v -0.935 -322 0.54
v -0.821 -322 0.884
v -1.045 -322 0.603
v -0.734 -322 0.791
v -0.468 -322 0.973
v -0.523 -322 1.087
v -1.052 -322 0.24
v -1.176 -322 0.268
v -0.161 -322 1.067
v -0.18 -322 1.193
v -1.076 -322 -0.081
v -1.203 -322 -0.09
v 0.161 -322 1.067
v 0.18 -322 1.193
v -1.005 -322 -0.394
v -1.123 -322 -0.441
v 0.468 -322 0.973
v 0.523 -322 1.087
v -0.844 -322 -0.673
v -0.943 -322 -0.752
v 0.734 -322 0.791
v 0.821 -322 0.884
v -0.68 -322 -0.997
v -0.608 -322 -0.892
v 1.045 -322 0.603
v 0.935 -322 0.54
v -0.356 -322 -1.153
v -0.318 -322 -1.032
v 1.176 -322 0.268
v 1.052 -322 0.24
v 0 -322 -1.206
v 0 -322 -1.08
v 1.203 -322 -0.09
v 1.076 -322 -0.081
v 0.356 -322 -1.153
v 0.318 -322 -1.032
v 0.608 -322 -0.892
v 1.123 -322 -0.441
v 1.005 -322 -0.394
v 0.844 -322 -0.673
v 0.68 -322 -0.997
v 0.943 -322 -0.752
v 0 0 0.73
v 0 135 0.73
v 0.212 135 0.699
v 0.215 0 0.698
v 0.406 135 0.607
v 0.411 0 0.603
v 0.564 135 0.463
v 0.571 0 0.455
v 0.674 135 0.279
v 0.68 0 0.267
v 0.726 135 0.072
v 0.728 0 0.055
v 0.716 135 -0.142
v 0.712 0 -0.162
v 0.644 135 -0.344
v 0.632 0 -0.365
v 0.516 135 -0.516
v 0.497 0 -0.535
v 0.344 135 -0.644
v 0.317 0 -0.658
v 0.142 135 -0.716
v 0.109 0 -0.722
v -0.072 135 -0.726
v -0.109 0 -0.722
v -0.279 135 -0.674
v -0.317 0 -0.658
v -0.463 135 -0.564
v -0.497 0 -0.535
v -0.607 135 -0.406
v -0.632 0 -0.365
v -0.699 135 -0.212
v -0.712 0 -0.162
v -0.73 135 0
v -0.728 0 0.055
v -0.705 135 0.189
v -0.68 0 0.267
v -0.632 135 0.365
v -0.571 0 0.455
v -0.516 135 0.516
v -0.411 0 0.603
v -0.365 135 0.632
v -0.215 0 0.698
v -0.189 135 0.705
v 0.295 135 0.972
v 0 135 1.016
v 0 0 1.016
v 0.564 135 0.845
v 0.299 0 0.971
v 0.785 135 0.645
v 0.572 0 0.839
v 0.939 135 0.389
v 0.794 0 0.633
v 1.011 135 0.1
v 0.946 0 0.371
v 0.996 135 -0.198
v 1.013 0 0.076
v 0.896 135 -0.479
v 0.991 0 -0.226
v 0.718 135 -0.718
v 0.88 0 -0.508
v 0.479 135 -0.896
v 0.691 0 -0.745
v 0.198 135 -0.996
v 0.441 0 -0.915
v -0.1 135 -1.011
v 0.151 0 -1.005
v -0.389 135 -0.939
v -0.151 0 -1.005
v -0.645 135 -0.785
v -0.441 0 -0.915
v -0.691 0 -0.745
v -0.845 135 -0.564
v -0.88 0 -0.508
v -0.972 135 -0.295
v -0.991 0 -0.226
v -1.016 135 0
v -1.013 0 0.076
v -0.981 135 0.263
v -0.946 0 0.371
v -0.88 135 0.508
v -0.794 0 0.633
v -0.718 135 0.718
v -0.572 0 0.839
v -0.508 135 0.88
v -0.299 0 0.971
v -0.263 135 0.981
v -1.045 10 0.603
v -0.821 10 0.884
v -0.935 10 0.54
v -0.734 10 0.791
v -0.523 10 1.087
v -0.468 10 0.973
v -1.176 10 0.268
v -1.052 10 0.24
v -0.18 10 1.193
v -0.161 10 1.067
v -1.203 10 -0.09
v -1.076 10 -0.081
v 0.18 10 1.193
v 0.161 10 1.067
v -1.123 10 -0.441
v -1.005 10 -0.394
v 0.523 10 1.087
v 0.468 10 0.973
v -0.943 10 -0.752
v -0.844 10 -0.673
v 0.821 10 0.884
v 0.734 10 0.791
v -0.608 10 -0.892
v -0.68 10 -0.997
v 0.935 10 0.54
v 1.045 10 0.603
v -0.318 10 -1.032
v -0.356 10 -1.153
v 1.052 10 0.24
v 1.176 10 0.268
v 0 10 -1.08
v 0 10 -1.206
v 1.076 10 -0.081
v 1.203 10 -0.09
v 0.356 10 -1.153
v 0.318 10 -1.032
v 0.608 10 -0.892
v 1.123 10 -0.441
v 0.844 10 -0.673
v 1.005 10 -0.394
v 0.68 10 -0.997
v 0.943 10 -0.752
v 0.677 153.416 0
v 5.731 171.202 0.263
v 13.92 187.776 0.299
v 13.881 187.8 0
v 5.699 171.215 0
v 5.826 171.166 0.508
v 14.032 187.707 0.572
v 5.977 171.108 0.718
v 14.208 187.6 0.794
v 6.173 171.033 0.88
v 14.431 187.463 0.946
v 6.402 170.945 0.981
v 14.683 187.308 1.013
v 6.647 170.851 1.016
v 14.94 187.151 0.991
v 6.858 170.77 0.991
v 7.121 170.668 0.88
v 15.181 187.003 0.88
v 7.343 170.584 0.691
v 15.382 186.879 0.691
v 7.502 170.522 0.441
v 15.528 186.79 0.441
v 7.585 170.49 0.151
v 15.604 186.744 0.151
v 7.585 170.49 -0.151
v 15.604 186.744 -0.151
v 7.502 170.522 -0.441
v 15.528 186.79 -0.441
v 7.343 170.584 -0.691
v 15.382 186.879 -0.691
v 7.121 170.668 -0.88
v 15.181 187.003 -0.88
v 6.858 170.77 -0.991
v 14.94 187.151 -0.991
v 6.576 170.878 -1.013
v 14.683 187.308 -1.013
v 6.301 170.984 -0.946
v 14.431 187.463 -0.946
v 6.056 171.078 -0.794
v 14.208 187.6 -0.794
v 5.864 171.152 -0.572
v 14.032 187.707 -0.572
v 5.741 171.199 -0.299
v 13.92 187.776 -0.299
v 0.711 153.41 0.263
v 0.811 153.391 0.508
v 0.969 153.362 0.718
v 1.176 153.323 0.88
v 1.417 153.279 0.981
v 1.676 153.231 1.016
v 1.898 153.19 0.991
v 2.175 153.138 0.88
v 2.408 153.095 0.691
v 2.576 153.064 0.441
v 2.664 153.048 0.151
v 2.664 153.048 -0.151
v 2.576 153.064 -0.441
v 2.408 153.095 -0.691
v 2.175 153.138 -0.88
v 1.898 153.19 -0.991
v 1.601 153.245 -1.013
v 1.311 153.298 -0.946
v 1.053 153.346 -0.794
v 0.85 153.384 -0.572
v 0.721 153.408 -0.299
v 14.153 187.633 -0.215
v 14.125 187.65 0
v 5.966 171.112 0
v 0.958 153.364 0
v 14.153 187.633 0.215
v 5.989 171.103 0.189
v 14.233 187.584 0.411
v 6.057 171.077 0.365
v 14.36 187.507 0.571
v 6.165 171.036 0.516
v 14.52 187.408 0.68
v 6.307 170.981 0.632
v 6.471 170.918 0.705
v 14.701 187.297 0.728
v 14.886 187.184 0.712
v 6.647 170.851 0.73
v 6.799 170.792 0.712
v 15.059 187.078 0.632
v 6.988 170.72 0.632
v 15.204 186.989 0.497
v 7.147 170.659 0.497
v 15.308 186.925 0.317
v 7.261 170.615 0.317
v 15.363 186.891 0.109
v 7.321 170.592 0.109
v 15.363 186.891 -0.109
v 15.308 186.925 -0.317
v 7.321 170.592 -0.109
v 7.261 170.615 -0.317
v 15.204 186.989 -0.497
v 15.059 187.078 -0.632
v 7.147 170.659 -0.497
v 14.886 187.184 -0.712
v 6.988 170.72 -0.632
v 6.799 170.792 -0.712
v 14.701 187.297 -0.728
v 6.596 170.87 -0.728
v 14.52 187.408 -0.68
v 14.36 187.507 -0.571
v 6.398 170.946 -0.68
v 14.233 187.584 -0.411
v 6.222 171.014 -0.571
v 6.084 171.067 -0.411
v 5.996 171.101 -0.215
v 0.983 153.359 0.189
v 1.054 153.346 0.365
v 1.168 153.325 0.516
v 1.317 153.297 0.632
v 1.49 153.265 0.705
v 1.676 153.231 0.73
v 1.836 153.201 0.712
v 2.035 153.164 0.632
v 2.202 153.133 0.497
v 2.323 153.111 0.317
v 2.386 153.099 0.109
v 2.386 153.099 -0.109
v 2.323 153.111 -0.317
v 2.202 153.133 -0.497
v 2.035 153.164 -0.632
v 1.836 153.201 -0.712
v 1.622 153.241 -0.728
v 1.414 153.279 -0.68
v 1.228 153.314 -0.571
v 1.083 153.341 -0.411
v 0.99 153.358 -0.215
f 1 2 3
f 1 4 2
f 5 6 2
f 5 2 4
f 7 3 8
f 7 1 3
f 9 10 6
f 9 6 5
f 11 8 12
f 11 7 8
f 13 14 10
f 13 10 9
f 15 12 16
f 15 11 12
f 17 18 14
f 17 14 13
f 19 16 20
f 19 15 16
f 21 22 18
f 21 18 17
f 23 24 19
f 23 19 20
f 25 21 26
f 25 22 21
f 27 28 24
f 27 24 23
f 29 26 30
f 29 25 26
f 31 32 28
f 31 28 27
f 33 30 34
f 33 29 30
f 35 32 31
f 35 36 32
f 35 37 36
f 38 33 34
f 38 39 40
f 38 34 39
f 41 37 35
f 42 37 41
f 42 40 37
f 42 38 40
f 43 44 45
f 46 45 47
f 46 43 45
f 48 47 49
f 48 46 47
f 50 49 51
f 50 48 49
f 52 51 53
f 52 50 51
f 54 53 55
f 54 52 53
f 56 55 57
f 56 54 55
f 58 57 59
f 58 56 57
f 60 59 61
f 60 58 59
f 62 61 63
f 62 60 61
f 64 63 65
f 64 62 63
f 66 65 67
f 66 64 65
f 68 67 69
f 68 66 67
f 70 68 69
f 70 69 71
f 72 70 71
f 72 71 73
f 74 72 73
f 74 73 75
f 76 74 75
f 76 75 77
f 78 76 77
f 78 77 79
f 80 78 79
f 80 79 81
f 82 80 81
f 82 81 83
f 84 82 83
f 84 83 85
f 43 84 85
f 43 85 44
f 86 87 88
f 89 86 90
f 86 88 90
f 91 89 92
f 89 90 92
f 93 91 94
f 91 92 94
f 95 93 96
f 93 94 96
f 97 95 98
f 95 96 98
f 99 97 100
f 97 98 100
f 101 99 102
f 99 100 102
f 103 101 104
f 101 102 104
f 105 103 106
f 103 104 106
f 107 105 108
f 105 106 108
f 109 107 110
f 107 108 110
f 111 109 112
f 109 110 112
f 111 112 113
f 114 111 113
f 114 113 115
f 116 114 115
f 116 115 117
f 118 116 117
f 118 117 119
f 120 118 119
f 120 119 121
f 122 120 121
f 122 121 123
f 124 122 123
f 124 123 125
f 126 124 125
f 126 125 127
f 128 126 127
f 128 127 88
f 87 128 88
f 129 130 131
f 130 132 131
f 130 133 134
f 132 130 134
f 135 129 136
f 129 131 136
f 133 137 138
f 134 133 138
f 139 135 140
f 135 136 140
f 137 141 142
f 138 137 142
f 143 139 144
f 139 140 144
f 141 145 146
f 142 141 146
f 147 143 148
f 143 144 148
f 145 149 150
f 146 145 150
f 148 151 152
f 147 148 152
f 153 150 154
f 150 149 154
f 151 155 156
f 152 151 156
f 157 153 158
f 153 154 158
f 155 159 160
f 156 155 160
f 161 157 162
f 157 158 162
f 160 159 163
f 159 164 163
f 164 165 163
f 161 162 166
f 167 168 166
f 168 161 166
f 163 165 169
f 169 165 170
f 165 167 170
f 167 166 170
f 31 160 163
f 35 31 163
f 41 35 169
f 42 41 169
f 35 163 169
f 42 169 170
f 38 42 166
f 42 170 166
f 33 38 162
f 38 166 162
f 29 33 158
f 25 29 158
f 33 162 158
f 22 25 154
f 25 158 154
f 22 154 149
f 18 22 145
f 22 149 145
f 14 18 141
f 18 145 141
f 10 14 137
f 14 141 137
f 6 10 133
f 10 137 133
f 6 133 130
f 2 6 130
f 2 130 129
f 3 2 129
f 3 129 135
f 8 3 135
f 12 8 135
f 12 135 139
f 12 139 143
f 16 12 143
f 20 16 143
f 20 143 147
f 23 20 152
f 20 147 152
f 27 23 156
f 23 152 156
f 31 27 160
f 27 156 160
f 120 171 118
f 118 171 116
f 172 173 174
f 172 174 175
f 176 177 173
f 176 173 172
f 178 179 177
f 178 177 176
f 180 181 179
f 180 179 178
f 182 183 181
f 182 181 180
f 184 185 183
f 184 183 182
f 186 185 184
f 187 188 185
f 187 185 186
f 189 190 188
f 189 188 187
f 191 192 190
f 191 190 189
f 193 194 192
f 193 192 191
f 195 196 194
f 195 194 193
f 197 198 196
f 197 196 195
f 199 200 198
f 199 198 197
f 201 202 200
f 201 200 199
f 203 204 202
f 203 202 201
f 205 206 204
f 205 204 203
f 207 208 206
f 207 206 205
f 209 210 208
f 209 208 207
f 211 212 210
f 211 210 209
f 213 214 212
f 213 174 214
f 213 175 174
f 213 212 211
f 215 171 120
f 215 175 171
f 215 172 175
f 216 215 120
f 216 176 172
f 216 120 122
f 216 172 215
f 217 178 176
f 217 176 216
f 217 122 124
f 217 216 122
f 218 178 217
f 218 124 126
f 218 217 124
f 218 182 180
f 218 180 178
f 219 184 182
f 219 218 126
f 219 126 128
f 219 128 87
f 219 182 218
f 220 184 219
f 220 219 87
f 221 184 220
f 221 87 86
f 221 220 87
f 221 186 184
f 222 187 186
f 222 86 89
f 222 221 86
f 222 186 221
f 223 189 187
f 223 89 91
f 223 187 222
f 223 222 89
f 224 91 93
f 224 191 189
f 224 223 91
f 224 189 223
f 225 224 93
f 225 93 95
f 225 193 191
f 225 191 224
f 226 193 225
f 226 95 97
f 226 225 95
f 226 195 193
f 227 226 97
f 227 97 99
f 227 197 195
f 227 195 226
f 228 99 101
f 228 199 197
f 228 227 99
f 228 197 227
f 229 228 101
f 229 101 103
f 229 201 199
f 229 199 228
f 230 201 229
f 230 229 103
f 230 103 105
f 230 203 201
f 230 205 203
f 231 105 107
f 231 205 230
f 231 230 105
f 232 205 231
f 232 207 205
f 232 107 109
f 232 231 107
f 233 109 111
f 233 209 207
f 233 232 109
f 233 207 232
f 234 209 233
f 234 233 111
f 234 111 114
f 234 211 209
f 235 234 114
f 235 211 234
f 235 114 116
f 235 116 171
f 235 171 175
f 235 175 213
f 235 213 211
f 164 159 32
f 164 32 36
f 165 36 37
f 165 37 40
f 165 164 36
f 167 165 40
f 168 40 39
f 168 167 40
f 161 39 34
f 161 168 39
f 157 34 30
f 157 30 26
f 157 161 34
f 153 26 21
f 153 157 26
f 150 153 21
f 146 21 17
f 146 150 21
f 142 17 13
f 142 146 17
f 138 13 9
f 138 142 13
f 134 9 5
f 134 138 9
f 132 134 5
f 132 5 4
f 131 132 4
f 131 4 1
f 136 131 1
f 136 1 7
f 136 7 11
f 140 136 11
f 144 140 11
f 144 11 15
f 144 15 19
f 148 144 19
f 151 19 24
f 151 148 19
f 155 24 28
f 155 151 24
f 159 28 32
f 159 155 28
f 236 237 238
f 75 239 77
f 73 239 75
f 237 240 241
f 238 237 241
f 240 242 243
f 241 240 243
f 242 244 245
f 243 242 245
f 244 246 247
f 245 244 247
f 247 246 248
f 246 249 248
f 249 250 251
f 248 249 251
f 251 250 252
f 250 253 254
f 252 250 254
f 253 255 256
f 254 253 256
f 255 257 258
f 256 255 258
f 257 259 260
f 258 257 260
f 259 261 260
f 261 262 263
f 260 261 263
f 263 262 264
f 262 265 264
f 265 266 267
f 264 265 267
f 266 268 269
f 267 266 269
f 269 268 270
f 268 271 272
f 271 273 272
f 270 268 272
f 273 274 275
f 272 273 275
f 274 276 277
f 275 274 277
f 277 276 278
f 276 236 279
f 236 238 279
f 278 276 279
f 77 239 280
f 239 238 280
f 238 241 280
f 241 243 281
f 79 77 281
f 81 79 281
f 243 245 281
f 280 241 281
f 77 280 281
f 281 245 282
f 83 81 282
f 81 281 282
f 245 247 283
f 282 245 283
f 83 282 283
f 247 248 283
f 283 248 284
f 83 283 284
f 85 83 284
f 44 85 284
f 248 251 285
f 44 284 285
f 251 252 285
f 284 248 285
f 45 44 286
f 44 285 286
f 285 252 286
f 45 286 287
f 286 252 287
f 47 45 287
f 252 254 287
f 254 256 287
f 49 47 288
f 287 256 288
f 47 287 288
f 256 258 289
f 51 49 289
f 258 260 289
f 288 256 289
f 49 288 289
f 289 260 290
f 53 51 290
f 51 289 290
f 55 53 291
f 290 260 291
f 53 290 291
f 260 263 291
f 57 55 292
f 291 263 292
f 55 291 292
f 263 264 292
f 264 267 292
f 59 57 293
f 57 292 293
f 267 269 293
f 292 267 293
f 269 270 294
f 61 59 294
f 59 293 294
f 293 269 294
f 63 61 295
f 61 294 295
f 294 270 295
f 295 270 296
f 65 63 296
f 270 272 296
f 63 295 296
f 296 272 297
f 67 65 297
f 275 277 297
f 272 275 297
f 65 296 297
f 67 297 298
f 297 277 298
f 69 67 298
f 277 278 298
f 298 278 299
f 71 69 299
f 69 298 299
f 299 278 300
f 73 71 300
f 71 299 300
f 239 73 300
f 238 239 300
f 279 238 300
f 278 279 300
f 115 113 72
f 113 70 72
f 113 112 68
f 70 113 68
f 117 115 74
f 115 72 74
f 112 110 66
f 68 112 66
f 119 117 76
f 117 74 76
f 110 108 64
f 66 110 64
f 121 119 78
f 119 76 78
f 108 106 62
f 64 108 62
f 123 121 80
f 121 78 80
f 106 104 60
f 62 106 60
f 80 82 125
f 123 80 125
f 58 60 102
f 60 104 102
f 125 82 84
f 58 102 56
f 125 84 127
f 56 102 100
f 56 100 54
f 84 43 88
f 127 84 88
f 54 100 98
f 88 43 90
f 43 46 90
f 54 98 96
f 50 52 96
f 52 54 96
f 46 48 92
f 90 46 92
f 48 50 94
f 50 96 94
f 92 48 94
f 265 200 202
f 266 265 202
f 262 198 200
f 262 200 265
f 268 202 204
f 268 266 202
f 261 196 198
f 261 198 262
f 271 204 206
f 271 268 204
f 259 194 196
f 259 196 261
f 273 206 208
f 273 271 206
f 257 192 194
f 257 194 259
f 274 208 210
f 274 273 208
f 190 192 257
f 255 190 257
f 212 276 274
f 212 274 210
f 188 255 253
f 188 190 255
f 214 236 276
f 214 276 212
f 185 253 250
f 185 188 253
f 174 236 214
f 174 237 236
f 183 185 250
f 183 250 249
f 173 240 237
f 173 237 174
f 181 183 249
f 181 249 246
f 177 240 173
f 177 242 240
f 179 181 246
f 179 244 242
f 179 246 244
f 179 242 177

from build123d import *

# Parameters (mm, degrees)
SKETCH1_R           = 1.016
SKETCH1_R_2         = 0.73
BOSS_EXTRUDE1_DEPTH = 135
SWEEP2_OUTLINE_R    = 1.016
SWEEP2_OUTLINE_R_2  = 0.73
SWEEP2_ANGLE        = 31.512679
SKETCH4_R           = 1.2065
SKETCH4_R_2         = 1.0795
BOSS_EXTRUDE2_DEPTH = 332


# Read off the part's stored shape, not the designer's step: Sweep2
with BuildPart() as part:
    # Sketch1 → Boss-Extrude1 (new body)
    with BuildSketch(Plane(origin=(0, 0, 0), x_dir=(1, 0, 0), z_dir=(0, 1, 0))):
        with Locations(Location((0, 0, 0), (0, 0, 270))):
            Circle(SKETCH1_R)
        with Locations(Location((0, 0, 0), (0, 0, 270))):
            Circle(SKETCH1_R_2, mode=Mode.SUBTRACT)
    extrude(amount=BOSS_EXTRUDE1_DEPTH)

    # Sweep2 outline → Sweep2 (revolve)
    with BuildSketch(Plane(origin=(100, 135, 0), x_dir=(-0.8525245220595056, 0.5226872289306596, 0), z_dir=(0.5226872289306596, 0.8525245220595056, 0))):
        with Locations((100, 0)):
            Circle(SWEEP2_OUTLINE_R)
        with Locations((100, 0)):
            Circle(SWEEP2_OUTLINE_R_2, mode=Mode.SUBTRACT)
    revolve(axis=Axis((100, 135, 0), (0, 0, 1)), revolution_arc=SWEEP2_ANGLE)


with BuildPart() as body_2:
    # Sketch4 → Boss-Extrude2 (new body)
    with BuildSketch(Plane(origin=(0, 10, 0), x_dir=(-1, 0, 0), z_dir=(0, -1, 0))):
        with Locations(Location((0, 0, 0), (0, 0, 90))):
            Circle(SKETCH4_R)
        with Locations(Location((0, 0, 0), (0, 0, 90))):
            Circle(SKETCH4_R_2, mode=Mode.SUBTRACT)
    extrude(amount=BOSS_EXTRUDE2_DEPTH)


solid = Compound([part.part, body_2.part])
